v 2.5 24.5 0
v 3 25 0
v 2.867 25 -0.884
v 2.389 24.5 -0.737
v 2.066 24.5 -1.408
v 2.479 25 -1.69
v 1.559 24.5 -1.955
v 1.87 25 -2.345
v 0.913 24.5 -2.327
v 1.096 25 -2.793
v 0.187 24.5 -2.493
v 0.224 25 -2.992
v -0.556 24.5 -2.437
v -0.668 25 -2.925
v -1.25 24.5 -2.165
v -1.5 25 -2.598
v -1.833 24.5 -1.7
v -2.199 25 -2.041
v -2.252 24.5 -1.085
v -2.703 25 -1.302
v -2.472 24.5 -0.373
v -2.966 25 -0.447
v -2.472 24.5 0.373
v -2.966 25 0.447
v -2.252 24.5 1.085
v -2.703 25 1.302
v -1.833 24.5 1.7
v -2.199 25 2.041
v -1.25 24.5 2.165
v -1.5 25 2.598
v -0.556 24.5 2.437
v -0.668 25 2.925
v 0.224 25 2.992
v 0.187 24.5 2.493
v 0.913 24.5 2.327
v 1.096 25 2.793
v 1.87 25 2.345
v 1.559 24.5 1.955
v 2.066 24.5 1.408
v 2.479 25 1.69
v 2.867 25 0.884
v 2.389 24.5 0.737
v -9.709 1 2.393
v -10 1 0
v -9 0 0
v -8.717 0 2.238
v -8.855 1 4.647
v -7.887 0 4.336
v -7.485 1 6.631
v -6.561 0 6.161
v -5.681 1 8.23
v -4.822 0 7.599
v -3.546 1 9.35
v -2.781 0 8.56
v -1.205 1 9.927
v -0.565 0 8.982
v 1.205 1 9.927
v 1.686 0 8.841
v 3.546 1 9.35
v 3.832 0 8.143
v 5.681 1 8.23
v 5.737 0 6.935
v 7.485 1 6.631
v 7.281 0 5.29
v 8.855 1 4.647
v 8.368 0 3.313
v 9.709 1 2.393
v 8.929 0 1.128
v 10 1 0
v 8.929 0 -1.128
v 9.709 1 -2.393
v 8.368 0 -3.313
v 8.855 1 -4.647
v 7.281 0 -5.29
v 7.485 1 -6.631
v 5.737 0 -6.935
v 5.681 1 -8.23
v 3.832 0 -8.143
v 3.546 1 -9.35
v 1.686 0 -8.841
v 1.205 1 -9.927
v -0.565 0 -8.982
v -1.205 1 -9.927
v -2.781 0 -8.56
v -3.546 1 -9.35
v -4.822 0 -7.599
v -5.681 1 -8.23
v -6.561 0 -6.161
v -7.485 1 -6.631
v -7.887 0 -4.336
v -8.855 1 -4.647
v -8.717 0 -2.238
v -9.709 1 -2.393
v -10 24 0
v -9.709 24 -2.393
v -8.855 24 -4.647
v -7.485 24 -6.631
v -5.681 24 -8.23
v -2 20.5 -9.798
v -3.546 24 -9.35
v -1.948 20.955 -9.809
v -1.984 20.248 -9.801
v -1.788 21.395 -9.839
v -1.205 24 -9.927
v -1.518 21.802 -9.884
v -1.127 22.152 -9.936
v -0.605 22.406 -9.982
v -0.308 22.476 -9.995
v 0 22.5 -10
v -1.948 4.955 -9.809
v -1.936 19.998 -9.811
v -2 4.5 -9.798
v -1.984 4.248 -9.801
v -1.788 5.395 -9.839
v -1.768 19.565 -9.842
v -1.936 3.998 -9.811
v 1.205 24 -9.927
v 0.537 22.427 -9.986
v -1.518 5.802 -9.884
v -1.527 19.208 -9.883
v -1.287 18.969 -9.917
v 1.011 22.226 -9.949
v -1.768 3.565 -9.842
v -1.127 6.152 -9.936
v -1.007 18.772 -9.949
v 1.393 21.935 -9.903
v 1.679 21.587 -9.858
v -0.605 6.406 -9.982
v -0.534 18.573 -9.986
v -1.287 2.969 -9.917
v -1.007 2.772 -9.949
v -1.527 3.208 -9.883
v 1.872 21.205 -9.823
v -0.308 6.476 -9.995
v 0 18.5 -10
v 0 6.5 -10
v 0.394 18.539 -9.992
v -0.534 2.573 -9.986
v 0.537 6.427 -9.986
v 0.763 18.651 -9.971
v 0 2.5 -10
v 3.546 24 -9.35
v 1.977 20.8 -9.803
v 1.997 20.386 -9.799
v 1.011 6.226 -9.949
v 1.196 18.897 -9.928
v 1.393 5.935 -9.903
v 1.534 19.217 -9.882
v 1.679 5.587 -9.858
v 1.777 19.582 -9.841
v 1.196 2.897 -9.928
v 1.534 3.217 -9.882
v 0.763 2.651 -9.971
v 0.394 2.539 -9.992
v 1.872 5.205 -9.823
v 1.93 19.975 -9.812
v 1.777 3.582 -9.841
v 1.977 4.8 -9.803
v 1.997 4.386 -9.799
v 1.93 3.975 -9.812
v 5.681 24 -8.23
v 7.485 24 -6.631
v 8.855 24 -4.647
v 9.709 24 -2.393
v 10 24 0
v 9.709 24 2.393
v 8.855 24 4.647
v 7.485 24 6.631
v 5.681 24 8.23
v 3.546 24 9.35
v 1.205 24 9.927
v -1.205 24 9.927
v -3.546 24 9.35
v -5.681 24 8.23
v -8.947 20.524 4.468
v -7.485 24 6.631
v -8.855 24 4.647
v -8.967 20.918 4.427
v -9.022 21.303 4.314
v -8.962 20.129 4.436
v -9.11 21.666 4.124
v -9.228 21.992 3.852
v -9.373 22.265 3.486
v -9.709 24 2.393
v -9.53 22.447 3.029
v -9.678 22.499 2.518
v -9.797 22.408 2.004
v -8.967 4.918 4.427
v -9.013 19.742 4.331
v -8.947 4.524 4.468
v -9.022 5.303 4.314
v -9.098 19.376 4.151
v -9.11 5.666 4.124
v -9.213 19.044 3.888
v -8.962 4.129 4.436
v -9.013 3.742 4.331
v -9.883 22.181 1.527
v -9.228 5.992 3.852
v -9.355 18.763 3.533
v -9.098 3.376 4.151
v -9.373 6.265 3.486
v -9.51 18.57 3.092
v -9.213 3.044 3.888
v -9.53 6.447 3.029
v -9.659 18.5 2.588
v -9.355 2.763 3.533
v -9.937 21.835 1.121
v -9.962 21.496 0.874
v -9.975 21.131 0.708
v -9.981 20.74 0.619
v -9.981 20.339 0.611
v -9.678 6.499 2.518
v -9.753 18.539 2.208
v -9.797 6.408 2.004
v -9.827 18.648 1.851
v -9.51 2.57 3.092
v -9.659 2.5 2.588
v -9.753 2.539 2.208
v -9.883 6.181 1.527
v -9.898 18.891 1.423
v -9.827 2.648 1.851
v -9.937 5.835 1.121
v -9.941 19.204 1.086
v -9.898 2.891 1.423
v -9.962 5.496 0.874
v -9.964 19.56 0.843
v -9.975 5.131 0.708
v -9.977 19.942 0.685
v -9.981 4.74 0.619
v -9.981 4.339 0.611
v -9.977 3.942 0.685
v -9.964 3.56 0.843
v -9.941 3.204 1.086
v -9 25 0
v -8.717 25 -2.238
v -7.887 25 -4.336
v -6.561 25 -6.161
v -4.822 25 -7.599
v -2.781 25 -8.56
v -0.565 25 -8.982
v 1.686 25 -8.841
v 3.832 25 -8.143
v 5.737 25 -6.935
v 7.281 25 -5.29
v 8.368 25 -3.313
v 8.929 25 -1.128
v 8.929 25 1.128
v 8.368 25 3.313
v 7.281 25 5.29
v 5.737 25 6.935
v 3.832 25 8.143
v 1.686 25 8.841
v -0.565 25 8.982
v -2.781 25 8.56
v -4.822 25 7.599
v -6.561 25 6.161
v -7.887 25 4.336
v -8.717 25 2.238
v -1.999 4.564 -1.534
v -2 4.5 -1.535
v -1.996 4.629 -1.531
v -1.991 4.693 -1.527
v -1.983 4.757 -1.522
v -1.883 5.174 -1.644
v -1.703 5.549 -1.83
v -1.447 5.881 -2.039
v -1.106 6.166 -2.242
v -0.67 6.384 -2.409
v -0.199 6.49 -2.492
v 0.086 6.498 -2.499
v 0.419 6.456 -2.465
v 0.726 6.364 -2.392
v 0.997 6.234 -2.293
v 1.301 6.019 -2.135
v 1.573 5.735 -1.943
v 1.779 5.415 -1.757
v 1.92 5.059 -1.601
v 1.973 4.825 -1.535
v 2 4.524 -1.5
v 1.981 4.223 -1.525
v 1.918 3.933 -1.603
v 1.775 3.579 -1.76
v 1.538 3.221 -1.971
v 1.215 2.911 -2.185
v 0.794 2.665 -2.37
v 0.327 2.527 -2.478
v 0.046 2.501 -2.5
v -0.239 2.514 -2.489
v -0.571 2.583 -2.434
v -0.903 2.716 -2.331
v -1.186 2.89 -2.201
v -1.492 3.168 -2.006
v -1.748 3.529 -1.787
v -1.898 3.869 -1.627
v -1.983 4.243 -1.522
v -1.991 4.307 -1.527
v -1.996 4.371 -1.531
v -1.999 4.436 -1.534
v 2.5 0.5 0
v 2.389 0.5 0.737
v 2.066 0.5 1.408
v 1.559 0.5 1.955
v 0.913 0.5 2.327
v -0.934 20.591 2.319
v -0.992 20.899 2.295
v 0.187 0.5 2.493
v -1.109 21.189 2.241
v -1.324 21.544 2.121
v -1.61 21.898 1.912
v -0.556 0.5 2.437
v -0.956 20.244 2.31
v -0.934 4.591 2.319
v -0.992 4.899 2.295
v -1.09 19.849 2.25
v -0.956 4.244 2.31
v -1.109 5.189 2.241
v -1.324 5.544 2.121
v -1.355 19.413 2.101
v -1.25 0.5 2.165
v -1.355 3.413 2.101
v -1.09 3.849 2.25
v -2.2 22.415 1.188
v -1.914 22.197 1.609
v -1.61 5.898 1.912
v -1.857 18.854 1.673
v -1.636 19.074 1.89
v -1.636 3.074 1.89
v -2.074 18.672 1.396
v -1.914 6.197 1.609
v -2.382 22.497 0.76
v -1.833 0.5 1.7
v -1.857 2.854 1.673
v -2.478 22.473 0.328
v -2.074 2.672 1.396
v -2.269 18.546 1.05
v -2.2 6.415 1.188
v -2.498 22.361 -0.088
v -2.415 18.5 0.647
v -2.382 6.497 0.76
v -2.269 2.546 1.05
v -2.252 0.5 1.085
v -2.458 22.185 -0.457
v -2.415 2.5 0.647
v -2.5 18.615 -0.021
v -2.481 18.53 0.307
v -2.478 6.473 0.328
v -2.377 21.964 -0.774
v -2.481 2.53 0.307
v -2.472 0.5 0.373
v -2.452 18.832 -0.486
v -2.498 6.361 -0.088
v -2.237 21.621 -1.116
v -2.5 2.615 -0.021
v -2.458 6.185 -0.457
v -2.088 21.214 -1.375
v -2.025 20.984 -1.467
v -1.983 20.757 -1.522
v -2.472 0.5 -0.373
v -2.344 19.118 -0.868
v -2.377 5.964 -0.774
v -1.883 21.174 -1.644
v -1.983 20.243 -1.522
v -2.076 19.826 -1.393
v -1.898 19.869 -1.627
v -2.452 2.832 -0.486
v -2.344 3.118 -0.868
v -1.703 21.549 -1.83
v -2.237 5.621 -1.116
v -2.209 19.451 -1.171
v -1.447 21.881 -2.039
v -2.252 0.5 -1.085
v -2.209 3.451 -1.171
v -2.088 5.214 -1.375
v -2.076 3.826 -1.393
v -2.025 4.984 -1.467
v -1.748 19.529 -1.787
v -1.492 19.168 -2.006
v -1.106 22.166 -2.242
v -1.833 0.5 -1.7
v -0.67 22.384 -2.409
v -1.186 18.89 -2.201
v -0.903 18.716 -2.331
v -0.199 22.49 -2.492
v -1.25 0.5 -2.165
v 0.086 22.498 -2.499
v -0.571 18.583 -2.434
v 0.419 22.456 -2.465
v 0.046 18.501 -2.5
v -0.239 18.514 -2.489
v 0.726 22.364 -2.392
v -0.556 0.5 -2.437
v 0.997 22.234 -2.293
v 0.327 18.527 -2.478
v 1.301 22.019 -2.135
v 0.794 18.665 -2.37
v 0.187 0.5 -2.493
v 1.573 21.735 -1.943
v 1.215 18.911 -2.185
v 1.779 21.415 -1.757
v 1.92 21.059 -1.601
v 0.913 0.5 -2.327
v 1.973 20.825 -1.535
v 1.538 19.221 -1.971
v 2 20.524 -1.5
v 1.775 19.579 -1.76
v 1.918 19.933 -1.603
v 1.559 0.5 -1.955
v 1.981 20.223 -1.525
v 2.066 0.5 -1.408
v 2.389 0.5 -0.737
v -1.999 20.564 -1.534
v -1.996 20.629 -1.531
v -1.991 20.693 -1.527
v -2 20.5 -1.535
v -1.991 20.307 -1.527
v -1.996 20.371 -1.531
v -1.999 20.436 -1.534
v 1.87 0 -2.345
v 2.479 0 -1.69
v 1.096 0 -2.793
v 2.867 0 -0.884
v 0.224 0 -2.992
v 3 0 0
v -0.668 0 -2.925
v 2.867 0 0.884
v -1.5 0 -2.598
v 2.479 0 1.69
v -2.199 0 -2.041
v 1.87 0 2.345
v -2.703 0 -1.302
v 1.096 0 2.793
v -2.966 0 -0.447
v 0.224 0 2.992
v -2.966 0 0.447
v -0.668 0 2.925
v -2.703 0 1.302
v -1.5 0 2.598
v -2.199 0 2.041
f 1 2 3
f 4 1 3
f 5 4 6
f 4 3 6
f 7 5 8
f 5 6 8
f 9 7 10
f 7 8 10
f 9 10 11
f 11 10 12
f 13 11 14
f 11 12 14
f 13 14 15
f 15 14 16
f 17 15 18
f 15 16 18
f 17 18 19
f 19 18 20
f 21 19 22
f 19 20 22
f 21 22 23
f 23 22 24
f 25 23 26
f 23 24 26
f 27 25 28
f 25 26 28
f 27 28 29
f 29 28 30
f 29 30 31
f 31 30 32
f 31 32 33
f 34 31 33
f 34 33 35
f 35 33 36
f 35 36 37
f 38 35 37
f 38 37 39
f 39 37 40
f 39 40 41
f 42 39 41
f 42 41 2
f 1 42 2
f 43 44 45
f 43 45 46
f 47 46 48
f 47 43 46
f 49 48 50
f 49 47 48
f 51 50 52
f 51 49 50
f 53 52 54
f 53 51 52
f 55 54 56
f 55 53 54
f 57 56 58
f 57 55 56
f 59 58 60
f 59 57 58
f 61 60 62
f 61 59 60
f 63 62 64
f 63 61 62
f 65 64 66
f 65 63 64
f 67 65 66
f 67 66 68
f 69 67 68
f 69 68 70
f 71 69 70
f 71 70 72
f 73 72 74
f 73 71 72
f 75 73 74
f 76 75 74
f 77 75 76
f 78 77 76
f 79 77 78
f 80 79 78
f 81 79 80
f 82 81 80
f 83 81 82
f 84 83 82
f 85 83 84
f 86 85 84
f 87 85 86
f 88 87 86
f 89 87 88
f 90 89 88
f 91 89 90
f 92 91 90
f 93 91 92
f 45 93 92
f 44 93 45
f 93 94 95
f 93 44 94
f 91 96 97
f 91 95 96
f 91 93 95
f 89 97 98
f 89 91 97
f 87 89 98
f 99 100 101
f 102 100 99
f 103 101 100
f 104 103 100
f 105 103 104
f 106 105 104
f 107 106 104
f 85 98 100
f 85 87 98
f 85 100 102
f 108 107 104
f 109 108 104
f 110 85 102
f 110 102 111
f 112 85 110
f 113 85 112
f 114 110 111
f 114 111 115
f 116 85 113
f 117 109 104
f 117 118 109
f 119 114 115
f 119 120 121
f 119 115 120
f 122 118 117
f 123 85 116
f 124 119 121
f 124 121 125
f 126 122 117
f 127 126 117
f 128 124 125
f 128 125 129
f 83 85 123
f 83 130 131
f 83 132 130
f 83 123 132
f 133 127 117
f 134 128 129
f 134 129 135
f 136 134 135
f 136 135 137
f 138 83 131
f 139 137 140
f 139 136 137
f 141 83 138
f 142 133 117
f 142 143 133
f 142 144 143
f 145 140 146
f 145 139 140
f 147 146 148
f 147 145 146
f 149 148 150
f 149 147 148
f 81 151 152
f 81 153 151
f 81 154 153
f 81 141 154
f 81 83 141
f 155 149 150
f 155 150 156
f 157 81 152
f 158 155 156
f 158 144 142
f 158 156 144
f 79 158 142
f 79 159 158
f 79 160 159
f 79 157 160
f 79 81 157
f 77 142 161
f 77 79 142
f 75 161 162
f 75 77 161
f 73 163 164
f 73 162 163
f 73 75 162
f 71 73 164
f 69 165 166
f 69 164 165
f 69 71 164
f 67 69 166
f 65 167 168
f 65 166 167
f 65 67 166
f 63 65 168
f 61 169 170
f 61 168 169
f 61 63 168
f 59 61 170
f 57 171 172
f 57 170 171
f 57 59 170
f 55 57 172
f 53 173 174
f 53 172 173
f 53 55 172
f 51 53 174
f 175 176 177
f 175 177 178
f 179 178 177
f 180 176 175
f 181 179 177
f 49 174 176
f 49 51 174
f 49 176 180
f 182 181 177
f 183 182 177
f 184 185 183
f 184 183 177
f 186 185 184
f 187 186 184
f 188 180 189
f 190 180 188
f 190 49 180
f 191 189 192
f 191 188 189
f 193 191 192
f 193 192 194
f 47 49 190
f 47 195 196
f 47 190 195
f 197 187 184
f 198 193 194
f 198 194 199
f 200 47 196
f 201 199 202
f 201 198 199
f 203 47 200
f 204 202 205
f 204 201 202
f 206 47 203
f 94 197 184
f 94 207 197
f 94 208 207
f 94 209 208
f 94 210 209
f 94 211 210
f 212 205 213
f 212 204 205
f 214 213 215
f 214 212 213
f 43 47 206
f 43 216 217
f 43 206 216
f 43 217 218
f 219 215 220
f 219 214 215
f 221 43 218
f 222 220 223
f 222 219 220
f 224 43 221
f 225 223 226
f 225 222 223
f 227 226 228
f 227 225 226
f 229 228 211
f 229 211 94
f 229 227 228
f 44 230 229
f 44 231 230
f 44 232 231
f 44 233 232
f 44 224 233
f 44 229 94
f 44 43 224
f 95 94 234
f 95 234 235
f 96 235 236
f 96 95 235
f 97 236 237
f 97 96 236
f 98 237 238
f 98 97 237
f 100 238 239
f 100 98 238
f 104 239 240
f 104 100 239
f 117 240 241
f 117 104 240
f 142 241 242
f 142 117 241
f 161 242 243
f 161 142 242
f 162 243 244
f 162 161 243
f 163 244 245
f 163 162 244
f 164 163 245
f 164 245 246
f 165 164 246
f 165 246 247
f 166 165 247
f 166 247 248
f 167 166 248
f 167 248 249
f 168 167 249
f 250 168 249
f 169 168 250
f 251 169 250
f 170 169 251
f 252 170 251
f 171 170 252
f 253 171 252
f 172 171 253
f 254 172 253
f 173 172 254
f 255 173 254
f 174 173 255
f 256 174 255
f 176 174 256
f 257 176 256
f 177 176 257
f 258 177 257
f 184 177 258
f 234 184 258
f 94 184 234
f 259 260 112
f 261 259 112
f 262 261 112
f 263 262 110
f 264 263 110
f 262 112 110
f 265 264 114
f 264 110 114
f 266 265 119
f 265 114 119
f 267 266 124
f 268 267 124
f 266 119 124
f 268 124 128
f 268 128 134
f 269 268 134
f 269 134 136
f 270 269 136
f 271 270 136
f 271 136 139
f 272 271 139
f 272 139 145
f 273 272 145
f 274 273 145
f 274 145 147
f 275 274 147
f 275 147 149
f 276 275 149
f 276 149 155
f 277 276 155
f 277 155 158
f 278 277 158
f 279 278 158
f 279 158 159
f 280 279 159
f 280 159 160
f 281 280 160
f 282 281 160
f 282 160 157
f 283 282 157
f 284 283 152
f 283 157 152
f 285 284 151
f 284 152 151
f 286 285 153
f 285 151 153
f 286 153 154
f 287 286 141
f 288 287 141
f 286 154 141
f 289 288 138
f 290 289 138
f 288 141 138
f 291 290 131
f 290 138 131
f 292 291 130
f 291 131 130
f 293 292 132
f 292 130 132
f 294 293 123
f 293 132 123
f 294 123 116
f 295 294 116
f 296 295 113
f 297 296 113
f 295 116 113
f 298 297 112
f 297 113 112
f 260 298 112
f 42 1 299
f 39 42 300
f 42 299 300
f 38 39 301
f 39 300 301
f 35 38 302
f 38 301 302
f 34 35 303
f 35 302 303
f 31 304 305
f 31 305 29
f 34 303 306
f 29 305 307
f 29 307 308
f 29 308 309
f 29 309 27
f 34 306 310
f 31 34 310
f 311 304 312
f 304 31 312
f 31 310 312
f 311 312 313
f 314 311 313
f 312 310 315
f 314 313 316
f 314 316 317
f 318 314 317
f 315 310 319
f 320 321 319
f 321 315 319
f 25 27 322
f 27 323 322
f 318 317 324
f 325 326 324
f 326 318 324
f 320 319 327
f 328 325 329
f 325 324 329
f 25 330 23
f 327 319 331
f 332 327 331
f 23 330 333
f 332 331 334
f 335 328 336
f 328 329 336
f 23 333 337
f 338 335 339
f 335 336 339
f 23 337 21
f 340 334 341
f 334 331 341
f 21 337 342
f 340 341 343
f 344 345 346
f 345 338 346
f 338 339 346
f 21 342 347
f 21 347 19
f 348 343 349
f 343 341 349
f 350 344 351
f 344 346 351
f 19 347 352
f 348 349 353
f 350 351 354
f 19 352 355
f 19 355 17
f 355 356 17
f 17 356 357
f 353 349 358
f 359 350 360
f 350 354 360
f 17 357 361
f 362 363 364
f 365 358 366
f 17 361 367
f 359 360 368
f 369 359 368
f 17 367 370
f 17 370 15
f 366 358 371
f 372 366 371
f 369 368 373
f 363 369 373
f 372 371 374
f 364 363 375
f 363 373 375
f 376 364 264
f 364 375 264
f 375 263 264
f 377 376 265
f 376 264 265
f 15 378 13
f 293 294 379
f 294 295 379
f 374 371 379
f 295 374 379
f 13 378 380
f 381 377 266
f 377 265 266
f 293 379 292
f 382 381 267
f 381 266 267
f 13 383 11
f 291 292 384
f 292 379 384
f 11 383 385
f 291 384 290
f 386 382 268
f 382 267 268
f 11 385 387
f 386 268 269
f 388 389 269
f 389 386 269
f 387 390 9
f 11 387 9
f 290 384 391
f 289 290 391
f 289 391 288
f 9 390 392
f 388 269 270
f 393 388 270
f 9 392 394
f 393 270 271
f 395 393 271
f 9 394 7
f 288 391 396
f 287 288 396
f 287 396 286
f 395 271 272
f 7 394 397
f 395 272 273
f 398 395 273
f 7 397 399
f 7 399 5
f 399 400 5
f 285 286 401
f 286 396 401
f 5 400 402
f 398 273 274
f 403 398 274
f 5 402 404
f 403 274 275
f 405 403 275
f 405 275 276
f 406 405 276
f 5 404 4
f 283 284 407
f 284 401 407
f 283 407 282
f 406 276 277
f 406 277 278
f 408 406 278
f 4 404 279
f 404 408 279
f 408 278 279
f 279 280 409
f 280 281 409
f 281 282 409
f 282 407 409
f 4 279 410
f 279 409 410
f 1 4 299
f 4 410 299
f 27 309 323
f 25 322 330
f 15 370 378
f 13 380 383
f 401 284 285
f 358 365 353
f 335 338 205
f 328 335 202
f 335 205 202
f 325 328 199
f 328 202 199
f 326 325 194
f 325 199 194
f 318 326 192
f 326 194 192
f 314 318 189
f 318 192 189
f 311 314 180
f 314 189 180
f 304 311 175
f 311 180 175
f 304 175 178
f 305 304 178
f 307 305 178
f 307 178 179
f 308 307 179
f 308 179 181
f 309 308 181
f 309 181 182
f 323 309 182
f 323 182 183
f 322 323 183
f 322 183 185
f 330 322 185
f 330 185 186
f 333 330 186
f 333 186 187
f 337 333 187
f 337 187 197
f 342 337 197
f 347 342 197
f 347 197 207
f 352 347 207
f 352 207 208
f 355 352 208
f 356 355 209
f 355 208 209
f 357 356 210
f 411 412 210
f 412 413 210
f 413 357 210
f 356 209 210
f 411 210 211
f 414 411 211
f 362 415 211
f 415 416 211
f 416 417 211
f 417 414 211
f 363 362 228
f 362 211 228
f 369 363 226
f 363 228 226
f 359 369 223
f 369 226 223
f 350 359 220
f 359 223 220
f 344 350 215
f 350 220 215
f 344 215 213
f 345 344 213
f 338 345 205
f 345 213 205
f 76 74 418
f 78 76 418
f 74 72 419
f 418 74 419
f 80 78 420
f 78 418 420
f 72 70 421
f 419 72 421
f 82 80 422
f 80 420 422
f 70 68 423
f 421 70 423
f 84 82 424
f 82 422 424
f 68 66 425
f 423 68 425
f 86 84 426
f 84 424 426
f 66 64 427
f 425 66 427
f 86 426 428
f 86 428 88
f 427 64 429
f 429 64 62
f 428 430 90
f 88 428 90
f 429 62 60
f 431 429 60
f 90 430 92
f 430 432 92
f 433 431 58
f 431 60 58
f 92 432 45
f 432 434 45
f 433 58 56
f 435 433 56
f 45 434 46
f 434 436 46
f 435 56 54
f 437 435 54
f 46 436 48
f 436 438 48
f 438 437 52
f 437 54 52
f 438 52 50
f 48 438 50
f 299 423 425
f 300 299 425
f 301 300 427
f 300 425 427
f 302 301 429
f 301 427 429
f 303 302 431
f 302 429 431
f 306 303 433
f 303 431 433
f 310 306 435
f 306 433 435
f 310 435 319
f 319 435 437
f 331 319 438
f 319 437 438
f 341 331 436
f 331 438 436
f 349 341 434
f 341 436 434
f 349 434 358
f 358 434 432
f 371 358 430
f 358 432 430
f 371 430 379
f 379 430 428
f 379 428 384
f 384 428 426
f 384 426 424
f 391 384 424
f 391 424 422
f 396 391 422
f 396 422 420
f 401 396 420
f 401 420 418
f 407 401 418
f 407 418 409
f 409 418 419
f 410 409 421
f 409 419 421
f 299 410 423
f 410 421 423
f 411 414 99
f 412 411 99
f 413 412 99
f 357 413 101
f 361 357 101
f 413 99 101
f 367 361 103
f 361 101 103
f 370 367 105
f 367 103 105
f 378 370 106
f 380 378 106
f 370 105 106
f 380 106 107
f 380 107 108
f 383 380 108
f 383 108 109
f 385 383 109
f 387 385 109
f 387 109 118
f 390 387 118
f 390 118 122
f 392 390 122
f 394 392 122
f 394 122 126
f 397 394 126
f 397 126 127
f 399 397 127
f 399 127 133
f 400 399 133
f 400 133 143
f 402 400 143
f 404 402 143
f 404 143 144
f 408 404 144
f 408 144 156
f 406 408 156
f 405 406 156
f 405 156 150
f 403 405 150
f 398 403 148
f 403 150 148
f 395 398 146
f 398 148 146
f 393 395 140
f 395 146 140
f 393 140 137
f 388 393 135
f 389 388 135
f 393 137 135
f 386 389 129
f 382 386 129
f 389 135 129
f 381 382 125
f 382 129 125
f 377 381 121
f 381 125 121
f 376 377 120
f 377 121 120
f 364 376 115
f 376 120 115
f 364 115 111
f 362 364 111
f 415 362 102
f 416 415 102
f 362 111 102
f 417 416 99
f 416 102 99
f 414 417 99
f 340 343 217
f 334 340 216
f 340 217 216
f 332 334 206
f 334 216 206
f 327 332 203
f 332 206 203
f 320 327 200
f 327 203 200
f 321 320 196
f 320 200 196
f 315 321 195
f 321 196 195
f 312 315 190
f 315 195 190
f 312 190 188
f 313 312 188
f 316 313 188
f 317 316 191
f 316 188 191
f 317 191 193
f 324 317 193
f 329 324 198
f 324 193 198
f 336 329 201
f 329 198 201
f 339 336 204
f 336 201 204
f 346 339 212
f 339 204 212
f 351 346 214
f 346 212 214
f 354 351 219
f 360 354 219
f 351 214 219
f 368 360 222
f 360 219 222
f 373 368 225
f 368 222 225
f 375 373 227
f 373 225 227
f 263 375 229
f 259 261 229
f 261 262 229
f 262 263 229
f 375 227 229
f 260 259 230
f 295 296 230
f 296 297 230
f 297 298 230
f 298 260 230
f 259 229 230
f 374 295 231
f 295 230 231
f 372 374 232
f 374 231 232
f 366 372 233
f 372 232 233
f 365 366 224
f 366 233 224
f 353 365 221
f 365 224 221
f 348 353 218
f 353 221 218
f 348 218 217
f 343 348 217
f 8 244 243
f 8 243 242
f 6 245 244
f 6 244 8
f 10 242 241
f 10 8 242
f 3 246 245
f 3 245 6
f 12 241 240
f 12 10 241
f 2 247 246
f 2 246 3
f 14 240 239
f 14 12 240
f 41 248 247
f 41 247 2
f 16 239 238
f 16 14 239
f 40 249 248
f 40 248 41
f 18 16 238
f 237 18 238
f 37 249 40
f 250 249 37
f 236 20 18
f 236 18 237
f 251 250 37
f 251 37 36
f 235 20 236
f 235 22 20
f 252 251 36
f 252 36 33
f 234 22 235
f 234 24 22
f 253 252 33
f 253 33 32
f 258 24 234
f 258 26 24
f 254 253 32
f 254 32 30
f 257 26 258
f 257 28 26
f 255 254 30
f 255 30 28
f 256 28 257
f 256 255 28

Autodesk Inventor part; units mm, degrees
ref_plane "YZ Plane" through (0, 0, 0) normal (1, 0, 0) x (0, 1, 0)
sketch "Sketch1" plane through (0, 0, 0) normal (0, 1, 0) x (-1, 0, 0)
  circle A0 centre (0, 0) radius 10
  dimension "d0" = 20
extrude "Extrusion1" add sketch "Sketch1" along normal blind 25
sketch "Sketch2" plane through (0, 25, 0) normal (0, 1, 0) x (1, 0, 0)
  circle A0 centre (0, 0) radius 10 projected
  circle A1 centre (0, 0) radius 2.5
  dimension "d3" = 5
extrude "Extrusion2" cut sketch "Sketch2" against normal blind 14 contours A1
sketch "Sketch3" plane through (0, 0, 0) normal (0, -1, 0) x (1, 0, 0)
  circle A0 centre (0, 0) radius 10 projected
  circle A1 centre (0, 0) radius 2.5
  dimension "d6" = 5
extrude "Extrusion3" cut sketch "Sketch3" against normal blind 11 contours A1
chamfer "Chamfer1" distance 1 angle 45 2 edges at (10, 25, 0) (10, 0, 0)
chamfer "Chamfer2" distance 0.5 angle 45 2 edges at (-2.5, 25, 0) (-2.5, 0, 0)
sketch "Sketch4" plane through (0, 25, 0) normal (0, 1, 0) x (1, 0, 0)
  circle A0 centre (0, 0) radius 9 projected
  circle A1 centre (0, 0) radius 3 projected
  circle A2 centre (0, 0) radius 10 projected
  line L0 (-10, 0) -> (10, 0) construction
  line L1 (0, 0) -> (-9.6593, -2.5882) construction
  point P0 (0, 10)
  point P1 (-9.6593, -2.5882)
  dimension "d28" = 15
ref_plane "Work Plane1" through (0, 25, -10) normal (0, 0, -1) x (-1, 0, 0)
ref_plane "Work Plane3" through (-9.6593, 25, 2.5882) normal (-0.9659, 0, 0.2588) x (0, -1, 0)
sketch "Sketch5" plane through (0, 25, -10) normal (0, 0, -1) x (-1, 0, 0)
  line L0 (10, -1) -> (-10, -1) projected
  line L1 (-10, -24) -> (10, -24) projected
  line L2 (-10, -24) -> (-10, -1) projected
  line L3 (10, -24) -> (10, -1) projected
  circle A0 centre (0, -4.5) radius 2
  circle A1 centre (0, -20.5) radius 2
  line L4 (-9, 0) -> (9, 0) projected
  line L5 (9, -25) -> (-9, -25) projected
  point P0 (0, -25)
  point P1 (0, -1)
  dimension "d16" = 4
  dimension "d17" = 4
  dimension "d18" = 4.5
  dimension "d19" = 4.5
extrude "Extrusion4" cut sketch "Sketch5" against normal blind 8.75 contours A0 | A1
sketch "Sketch6" plane through (-9.6593, 25, 2.5882) normal (-0.9659, 0, 0.2588) x (0, -1, 0)
  circle A0 centre (4.5, 0) radius 2
  line L0 (24, -10) -> (1, -10) projected
  line L1 (24, 10) -> (1, 10) projected
  line L2 (25, 9) -> (25, -9) projected
  line L3 (0, -9) -> (0, 9) projected
  circle A1 centre (20.5, 0) radius 2
  point P0 (25, 0)
  point P1 (0, 0)
  dimension "d22" = 4
  dimension "d23" = 4
  dimension "d24" = 4.5
  dimension "d25" = 4.5
extrude "Extrusion5" cut sketch "Sketch6" against normal blind 8.75
thread "Thread1" size "M4x0.7" class "6H" standard "ANSI Metric M Profile" full length
thread "Thread2" size "M4x0.7" class "6H" standard "ANSI Metric M Profile" full length
thread "Thread3" size "M4x0.7" class "6H" standard "ANSI Metric M Profile" full length
thread "Thread4" size "M4x0.7" class "6H" standard "ANSI Metric M Profile" full length
properties part number "ZACMEFlexCoupler" material "Aluminum 6061"
